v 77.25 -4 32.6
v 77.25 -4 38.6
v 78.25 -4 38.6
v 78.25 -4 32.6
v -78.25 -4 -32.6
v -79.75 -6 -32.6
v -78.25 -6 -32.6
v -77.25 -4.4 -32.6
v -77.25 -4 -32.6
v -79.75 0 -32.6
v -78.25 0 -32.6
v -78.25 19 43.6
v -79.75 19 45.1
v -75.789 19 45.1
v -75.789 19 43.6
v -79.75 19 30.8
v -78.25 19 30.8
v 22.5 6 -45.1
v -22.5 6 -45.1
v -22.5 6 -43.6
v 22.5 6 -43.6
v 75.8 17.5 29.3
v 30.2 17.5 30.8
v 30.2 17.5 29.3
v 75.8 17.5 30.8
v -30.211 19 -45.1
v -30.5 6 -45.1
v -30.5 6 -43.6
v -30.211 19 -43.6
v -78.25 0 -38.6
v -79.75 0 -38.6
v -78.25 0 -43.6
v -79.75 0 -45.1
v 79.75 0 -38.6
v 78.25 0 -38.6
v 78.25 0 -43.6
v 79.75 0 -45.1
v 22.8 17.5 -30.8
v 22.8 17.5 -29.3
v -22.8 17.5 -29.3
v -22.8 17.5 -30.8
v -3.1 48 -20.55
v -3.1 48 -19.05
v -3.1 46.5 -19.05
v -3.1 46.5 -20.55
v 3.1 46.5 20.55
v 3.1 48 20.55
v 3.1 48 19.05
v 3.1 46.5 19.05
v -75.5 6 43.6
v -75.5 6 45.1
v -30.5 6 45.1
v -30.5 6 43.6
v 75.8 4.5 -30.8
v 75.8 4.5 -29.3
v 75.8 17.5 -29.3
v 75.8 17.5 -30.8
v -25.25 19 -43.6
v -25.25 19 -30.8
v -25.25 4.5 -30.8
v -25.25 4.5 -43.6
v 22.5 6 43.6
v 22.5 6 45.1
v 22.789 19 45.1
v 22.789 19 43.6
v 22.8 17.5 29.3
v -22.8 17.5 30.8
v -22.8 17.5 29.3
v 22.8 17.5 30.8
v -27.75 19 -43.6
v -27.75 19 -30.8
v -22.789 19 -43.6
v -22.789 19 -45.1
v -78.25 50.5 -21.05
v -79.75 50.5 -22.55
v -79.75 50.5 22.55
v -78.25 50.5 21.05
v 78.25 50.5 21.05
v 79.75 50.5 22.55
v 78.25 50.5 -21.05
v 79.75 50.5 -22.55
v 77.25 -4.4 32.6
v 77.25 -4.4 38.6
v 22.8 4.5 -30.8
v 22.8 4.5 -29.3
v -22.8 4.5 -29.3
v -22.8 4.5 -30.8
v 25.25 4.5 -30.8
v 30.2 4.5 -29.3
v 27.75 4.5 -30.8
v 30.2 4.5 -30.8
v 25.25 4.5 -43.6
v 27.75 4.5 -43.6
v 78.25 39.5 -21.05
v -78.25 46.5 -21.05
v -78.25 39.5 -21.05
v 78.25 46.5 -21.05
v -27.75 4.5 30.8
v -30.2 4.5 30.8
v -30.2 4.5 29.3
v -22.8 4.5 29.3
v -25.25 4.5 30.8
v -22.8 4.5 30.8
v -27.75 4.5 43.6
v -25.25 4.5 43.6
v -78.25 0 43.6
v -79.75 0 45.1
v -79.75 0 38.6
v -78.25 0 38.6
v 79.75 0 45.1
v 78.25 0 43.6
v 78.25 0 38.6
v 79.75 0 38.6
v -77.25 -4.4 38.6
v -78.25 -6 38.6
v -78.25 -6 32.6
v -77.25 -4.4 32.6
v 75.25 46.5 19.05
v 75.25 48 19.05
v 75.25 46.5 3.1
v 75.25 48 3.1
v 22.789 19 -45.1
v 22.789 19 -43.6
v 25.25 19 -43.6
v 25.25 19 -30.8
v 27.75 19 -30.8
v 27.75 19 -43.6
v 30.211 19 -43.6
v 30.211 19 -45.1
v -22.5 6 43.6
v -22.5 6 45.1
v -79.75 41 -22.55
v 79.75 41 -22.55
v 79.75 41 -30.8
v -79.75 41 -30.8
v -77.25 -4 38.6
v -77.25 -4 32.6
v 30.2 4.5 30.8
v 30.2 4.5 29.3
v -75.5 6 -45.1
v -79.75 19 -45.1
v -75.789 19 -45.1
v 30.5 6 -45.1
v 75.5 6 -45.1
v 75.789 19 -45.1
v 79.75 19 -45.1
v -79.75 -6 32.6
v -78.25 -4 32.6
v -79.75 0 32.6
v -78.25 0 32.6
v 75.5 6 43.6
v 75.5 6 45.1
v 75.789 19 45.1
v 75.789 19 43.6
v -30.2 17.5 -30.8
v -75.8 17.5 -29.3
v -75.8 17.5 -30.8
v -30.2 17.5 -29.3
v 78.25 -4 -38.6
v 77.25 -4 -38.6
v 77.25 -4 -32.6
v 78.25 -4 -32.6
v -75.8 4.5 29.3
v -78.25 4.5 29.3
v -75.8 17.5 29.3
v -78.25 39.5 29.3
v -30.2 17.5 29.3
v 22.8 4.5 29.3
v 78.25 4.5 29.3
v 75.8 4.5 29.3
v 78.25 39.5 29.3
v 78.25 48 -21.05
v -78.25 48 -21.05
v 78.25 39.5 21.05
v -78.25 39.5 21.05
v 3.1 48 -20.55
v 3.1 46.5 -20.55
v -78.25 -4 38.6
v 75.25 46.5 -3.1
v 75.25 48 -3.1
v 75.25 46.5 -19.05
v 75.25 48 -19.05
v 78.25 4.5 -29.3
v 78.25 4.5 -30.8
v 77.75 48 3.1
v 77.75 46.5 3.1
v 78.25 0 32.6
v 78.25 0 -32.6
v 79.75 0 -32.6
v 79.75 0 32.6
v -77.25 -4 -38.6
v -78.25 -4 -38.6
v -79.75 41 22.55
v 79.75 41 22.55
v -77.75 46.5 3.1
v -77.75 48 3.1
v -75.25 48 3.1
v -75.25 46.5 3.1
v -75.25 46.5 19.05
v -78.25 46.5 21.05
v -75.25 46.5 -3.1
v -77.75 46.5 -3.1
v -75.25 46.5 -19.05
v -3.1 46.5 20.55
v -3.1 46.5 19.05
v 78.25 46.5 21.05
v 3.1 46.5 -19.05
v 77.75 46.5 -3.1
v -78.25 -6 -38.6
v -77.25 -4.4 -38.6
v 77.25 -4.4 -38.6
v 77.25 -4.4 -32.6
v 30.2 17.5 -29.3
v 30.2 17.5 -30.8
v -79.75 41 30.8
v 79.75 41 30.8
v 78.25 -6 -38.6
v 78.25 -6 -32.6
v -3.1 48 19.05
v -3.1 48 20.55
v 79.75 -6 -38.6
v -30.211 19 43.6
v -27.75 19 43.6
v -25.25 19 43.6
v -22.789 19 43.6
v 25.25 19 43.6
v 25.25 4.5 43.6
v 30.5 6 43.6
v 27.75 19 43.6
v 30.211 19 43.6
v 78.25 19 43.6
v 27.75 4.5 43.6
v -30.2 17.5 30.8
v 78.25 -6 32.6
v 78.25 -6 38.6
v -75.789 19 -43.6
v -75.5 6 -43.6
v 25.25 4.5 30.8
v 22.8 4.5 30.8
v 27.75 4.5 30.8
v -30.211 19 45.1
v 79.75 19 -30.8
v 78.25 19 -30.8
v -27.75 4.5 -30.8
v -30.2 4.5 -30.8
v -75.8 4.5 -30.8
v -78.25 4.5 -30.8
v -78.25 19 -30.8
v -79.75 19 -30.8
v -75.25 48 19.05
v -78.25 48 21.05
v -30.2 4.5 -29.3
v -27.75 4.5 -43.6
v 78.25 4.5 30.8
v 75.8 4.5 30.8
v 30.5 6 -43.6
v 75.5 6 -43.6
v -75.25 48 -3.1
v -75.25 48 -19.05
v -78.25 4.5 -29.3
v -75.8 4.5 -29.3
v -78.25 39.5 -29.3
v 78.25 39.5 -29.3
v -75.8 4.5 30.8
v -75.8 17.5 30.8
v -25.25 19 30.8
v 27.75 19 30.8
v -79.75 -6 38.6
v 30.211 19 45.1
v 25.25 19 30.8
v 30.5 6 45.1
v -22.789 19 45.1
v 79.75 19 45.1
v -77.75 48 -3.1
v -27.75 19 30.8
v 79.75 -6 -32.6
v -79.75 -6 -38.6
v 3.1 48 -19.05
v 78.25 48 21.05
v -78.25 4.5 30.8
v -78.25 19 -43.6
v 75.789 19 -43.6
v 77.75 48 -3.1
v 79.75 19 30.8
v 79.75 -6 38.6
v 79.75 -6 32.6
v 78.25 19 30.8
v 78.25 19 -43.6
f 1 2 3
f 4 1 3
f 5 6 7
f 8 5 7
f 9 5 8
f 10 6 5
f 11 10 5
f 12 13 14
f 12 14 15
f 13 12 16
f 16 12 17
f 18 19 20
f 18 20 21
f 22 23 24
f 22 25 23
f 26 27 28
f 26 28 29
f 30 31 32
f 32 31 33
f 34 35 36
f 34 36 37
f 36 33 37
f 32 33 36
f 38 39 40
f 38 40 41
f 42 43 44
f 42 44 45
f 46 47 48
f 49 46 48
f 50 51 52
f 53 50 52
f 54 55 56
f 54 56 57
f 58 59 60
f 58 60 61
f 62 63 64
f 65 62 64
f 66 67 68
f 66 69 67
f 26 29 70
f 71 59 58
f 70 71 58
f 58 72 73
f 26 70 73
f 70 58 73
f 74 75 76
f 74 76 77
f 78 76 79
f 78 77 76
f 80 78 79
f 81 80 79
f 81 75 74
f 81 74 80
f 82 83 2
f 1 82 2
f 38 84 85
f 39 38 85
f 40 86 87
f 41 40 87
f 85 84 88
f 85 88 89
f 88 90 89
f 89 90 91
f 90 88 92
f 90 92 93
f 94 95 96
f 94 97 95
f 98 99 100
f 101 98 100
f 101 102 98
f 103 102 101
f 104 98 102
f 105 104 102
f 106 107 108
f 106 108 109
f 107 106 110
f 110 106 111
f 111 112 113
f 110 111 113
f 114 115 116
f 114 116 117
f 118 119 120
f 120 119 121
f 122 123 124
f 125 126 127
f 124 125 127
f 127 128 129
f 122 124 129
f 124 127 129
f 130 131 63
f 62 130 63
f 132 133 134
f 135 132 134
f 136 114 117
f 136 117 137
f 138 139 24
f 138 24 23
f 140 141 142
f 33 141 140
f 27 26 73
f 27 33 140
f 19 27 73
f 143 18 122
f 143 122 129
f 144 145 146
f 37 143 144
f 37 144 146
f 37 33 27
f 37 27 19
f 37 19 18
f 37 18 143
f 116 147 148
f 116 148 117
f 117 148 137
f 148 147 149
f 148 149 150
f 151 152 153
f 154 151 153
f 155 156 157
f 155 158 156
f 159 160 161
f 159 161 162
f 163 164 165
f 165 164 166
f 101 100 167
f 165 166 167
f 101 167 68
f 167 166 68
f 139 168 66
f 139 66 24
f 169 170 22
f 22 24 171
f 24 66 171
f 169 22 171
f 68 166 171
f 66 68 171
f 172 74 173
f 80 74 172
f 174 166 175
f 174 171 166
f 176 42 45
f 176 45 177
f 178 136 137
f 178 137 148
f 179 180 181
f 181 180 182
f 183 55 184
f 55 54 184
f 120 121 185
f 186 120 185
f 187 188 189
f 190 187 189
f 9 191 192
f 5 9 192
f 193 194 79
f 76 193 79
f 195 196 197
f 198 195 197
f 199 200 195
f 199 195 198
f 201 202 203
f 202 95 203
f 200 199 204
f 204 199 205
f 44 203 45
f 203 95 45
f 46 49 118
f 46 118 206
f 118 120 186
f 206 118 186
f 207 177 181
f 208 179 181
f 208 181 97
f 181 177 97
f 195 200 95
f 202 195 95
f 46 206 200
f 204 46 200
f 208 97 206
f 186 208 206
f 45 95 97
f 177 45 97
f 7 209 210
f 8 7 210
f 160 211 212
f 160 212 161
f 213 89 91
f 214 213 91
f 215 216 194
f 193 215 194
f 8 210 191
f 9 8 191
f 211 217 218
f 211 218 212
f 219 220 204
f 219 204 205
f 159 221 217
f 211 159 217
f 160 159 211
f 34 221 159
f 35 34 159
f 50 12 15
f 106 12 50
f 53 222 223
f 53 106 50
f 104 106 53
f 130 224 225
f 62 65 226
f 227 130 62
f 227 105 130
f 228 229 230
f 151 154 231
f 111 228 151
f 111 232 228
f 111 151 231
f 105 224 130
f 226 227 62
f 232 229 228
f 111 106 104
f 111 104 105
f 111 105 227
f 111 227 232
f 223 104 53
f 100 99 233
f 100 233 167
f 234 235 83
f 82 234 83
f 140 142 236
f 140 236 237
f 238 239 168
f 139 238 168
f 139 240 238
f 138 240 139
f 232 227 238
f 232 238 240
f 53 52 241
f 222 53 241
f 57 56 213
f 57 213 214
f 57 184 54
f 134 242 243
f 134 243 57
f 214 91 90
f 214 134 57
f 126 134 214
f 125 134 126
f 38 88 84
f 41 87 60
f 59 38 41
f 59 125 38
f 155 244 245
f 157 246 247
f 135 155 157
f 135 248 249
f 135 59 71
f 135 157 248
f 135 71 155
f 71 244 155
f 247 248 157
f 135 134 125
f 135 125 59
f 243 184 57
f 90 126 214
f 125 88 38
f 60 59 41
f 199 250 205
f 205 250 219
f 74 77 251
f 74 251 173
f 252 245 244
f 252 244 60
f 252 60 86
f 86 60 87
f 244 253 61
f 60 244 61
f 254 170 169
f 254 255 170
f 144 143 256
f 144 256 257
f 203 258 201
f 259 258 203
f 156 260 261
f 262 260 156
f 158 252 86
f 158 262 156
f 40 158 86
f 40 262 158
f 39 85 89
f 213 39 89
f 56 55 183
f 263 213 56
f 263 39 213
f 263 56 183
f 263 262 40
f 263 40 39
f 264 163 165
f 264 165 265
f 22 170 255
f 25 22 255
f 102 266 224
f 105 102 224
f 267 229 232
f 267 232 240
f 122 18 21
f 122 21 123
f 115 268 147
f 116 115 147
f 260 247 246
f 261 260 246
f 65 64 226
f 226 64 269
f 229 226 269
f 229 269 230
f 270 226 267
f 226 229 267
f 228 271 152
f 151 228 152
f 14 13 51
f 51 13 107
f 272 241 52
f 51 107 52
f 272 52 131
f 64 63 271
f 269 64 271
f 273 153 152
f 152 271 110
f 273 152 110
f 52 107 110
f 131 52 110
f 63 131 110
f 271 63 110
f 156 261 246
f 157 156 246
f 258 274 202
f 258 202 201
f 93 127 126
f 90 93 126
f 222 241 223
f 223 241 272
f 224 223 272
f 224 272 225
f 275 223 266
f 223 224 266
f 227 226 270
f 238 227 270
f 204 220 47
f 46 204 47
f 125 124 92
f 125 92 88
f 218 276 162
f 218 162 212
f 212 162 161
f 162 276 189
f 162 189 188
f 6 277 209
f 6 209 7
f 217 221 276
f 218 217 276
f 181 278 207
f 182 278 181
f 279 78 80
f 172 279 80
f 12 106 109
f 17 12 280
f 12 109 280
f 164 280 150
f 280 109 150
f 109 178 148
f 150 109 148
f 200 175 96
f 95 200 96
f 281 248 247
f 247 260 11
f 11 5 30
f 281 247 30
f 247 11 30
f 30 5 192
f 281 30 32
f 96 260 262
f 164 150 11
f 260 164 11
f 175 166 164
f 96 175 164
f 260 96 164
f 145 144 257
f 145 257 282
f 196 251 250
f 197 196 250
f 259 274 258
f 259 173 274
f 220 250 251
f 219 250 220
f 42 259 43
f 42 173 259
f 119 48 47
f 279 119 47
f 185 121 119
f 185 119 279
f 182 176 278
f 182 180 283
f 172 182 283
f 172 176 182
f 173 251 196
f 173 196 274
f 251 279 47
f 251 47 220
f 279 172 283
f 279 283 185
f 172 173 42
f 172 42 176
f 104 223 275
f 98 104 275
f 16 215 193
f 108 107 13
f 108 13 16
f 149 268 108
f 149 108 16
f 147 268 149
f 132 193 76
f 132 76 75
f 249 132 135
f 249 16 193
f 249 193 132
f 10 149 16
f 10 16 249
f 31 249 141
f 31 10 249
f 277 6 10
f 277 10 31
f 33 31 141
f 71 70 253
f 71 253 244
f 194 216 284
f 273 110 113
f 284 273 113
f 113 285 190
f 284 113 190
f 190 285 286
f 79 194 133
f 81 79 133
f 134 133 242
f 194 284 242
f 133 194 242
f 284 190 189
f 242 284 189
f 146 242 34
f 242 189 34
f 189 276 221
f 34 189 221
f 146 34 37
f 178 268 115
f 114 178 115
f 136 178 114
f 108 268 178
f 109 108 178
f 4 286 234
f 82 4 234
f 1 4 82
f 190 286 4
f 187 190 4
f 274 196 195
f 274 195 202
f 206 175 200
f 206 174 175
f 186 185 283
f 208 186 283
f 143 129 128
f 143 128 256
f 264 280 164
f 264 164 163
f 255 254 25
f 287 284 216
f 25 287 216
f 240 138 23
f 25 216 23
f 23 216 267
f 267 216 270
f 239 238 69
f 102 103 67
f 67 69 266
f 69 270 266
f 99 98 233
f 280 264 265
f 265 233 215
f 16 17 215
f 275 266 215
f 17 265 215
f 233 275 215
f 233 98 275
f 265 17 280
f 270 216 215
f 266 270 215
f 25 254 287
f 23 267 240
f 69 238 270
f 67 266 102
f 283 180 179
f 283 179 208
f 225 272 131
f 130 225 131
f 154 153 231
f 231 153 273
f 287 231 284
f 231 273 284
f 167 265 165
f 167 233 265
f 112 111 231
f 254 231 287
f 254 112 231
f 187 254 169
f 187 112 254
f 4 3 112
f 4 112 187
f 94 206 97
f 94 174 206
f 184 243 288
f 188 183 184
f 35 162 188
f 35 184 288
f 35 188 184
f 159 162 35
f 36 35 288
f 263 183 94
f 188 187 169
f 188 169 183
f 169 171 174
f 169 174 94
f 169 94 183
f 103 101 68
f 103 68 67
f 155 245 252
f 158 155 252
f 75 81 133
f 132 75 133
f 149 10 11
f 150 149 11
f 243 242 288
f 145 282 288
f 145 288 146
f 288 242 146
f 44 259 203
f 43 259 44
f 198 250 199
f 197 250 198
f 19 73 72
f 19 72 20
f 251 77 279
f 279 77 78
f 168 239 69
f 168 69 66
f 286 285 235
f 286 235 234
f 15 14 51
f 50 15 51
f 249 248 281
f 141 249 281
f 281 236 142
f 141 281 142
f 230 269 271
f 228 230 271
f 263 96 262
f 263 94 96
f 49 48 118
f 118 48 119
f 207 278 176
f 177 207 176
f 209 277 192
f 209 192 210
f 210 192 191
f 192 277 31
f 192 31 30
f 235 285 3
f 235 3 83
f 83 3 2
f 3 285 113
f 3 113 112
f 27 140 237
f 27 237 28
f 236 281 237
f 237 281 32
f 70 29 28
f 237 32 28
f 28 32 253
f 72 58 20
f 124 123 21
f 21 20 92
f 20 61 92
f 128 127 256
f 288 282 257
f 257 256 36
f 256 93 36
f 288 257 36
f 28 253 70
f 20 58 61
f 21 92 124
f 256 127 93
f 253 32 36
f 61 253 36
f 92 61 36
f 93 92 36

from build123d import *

# Parameters (mm, degrees)
SKETCH_1_W                 = 159.5
SKETCH_1_H                 = 90.2
EXTRUDE_1_DEPTH            = 50.5
CUT_EXTRUDE_1_DEPTH        = 174.275820587
SHELL_1_T                  = -1.5
SKETCH_3_W                 = 6
SKETCH_3_H                 = 6
EXTRUDE_3_DEPTH            = 1.5
EXTRUDE_4_DEPTH            = 6
MIRROR_2_COPY_1_SKETCH_W   = 6
MIRROR_2_COPY_1_SKETCH_H   = 6
MIRROR_2_COPY_1_DEPTH      = 1.5
MIRROR_2_COPY_2_DEPTH      = 6
SKETCH_6_W                 = 50.5
SKETCH_6_H                 = 12.8
CUT_EXTRUDE_2_DEPTH        = 20
CUT_EXTRUDE_3_DEPTH        = 10
PATTERN_LINEAR_1_COUNT     = 2
PATTERN_LINEAR_1_PITCH     = 53
PATTERN_LINEAR_1_COL_COUNT = 2
PATTERN_LINEAR_1_COL_PITCH = 53
SKETCH_8_W                 = 2.45
SKETCH_8_H                 = 1.5
EXTRUDE_5_DEPTH            = 16
SKETCH_9_W                 = 156.5
SKETCH_9_H                 = 22.55
CUT_EXTRUDE_4_DEPTH        = 4.5
MIRROR_3_COPY_1_DEPTH      = 10
MIRROR_3_COPY_2_DEPTH      = 10
SKETCH_10_W                = 159.5
SKETCH_10_H                = 45.1
EXTRUDE_6_DEPTH            = 4
SKETCH_11_W                = 156.5
SKETCH_11_H                = 42.1
CUT_EXTRUDE_6_DEPTH        = 2.5
SKETCH_12_W                = 150.5
SKETCH_12_H                = 38.1
CUT_EXTRUDE_7_DEPTH        = 4
SKETCH_13_W                = 4
SKETCH_13_H                = 6.2
SKETCH_13_W_2              = 6.2
SKETCH_13_H_2              = 4
CUT_EXTRUDE_8_DEPTH        = 4


with BuildPart() as part:
    # Эскиз1 → Бобышка-Вытянуть1 (new body)
    with BuildSketch(Plane(origin=(0, 0, 0), x_dir=(1, 0, 0), z_dir=(0, 1, 0))):
        Rectangle(SKETCH_1_W, SKETCH_1_H)
    extrude(amount=EXTRUDE_1_DEPTH)

    # Эскиз2 → Вырез-Вытянуть1 (cut, through all)
    with BuildSketch(Plane(origin=(79.75, 0, 0), x_dir=(0, 0, -1), z_dir=(1, 0, 0))):
        Polygon((-46.1, 19), (-30.8, 19), (-30.8, 41), (-22.55, 41), (-22.55, 51.5), (22.55, 51.5), (22.55, 41), (30.8, 41), (30.8, 19), (46.1, 19), (46.1, 52.5), (-46.1, 52.5), align=None)
    extrude(amount=-CUT_EXTRUDE_1_DEPTH, mode=Mode.SUBTRACT)

    # Оболочка1
    shell_1_openings = [part.faces().sort_by_distance(p)[0] for p in [
        (0, 0, 0),
    ]]
    offset(amount=SHELL_1_T, openings=shell_1_openings, kind=Kind.INTERSECTION)

    # Эскиз3 → Бобышка-Вытянуть3 (add)
    with BuildSketch(Plane(origin=(79.75, 0, 0), x_dir=(0, 0, -1), z_dir=(1, 0, 0))):
        with Locations((-35.6, -3)):
            Rectangle(SKETCH_3_W, SKETCH_3_H)
    extrude_3 = extrude(amount=-EXTRUDE_3_DEPTH)

    # Эскиз4 → Бобышка-Вытянуть4 (add)
    with BuildSketch(Plane.XY.offset(38.6)):
        Polygon((78.25, -6), (77.25, -4.4), (77.25, -4), (78.75, -4), (78.75, -6), align=None)
    extrude_4 = extrude(amount=-EXTRUDE_4_DEPTH)

    # Зеркальное отражение1: Бобышка-Вытянуть3, Бобышка-Вытянуть4 across plane
    add(extrude_3.mirror(Plane.XY))
    add(extrude_4.mirror(Plane.XY))

    # Зеркальное отражение2: Бобышка-Вытянуть3, Бобышка-Вытянуть4 across plane
    add(extrude_3.mirror(Plane(origin=(0, 0, 0), x_dir=(0, 0, 1), z_dir=(1, 0, 0))))
    add(extrude_4.mirror(Plane(origin=(0, 0, 0), x_dir=(0, 0, 1), z_dir=(1, 0, 0))))

    # Зеркальное отражение2 copy 1 sketch → Зеркальное отражение2 copy 1 (add)
    with BuildSketch(Plane.ZY.offset(79.75)):
        with Locations((-35.6, -3)):
            Rectangle(MIRROR_2_COPY_1_SKETCH_W, MIRROR_2_COPY_1_SKETCH_H)
    extrude(amount=-MIRROR_2_COPY_1_DEPTH)

    # Зеркальное отражение2 copy 2 sketch → Зеркальное отражение2 copy 2 (add)
    with BuildSketch(Plane(origin=(0, 0, -38.6), x_dir=(-1, 0, 0), z_dir=(0, 0, -1))):
        Polygon((78.25, -6), (77.25, -4.4), (77.25, -4), (78.75, -4), (78.75, -6), align=None)
    extrude(amount=-MIRROR_2_COPY_2_DEPTH)

    # Эскиз6 → Вырез-Вытянуть2 (cut)
    with BuildSketch(Plane(origin=(0, 19, 0), x_dir=(1, 0, 0), z_dir=(0, 1, 0))):
        with Locations((0, -37.2)):
            Rectangle(SKETCH_6_W, SKETCH_6_H)
        with Locations((-53, -37.2)):
            Rectangle(SKETCH_6_W, SKETCH_6_H)
        with Locations((53, -37.2)):
            Rectangle(SKETCH_6_W, SKETCH_6_H)
    cut_extrude_2 = extrude(amount=-CUT_EXTRUDE_2_DEPTH, mode=Mode.SUBTRACT)

    # Эскиз7 → Вырез-Вытянуть3 (cut)
    with BuildSketch(Plane.XY.offset(45.1)):
        Polygon((-22.8, 19.5), (-22.5, 6), (22.5, 6), (22.8, 19.5), align=None)
    cut_extrude_3 = extrude(amount=-CUT_EXTRUDE_3_DEPTH, mode=Mode.SUBTRACT)

    # Линейный массив1: Вырез-Вытянуть3 ×2
    with Locations(*[(i * PATTERN_LINEAR_1_PITCH, 0, 0) for i in range(1, PATTERN_LINEAR_1_COUNT)]):
        add(cut_extrude_3, mode=Mode.SUBTRACT)

    # Линейный массив1 col: Вырез-Вытянуть3 ×2
    with Locations(*[(-i * PATTERN_LINEAR_1_COL_PITCH, 0, 0) for i in range(1, PATTERN_LINEAR_1_COL_COUNT)]):
        add(cut_extrude_3, mode=Mode.SUBTRACT)

    # Эскиз8 → Бобышка-Вытянуть5 (add)
    with BuildSketch(Plane.XZ.offset(-17.5)):
        Polygon((-30.2, 30.8), (-30.2, 29.3), (-22.8, 29.3), (-22.8, 30.8), (-25.25, 30.8), (-25.25, 43.6), (-27.75, 43.6), (-27.75, 30.8), align=None)
        Polygon((22.8, 30.8), (22.8, 29.3), (30.2, 29.3), (30.2, 30.8), (27.75, 30.8), (27.75, 43.6), (25.25, 43.6), (25.25, 30.8), align=None)
        with Locations((-77.025, 30.05)):
            Rectangle(SKETCH_8_W, SKETCH_8_H)
        with Locations((77.025, 30.05)):
            Rectangle(SKETCH_8_W, SKETCH_8_H)
    extrude_5 = extrude(amount=EXTRUDE_5_DEPTH)

    # Эскиз9 → Вырез-Вытянуть4 (cut)
    with BuildSketch(Plane.XZ):
        with Locations((0, 32.325)):
            Rectangle(SKETCH_9_W, SKETCH_9_H)
    cut_extrude_4 = extrude(amount=-CUT_EXTRUDE_4_DEPTH, mode=Mode.SUBTRACT)

    # Зеркальное отражение3: Вырез-Вытянуть2, Вырез-Вытянуть3, Бобышка-Вытянуть5, Вырез-Вытянуть4 across plane
    add(cut_extrude_2.mirror(Plane.XY), mode=Mode.SUBTRACT)
    add(cut_extrude_3.mirror(Plane.XY), mode=Mode.SUBTRACT)
    add(extrude_5.mirror(Plane.XY))
    add(cut_extrude_4.mirror(Plane.XY), mode=Mode.SUBTRACT)

    # Зеркальное отражение3 copy 1 sketch → Зеркальное отражение3 copy 1 (cut)
    with BuildSketch(Plane(origin=(53, 0, -45.1), x_dir=(1, 0, 0), z_dir=(0, 0, -1))):
        Polygon((-22.8, -19.5), (-22.5, -6), (22.5, -6), (22.8, -19.5), align=None)
    extrude(amount=-MIRROR_3_COPY_1_DEPTH, mode=Mode.SUBTRACT)

    # Зеркальное отражение3 copy 2 sketch → Зеркальное отражение3 copy 2 (cut)
    with BuildSketch(Plane(origin=(-53, 0, -45.1), x_dir=(1, 0, 0), z_dir=(0, 0, -1))):
        Polygon((-22.8, -19.5), (-22.5, -6), (22.5, -6), (22.8, -19.5), align=None)
    extrude(amount=-MIRROR_3_COPY_2_DEPTH, mode=Mode.SUBTRACT)

    # Эскиз10 → Бобышка-Вытянуть6 (add)
    with BuildSketch(Plane(origin=(0, 50.5, 0), x_dir=(1, 0, 0), z_dir=(0, 1, 0))):
        Rectangle(SKETCH_10_W, SKETCH_10_H)
    extrude(amount=-EXTRUDE_6_DEPTH)

    # Эскиз11 → Вырез-Вытянуть6 (cut)
    with BuildSketch(Plane(origin=(0, 50.5, 0), x_dir=(1, 0, 0), z_dir=(0, 1, 0))):
        Rectangle(SKETCH_11_W, SKETCH_11_H)
    extrude(amount=-CUT_EXTRUDE_6_DEPTH, mode=Mode.SUBTRACT)

    # Эскиз12 → Вырез-Вытянуть7 (cut)
    with BuildSketch(Plane(origin=(0, 48, 0), x_dir=(1, 0, 0), z_dir=(0, 1, 0))):
        Rectangle(SKETCH_12_W, SKETCH_12_H)
    extrude(amount=-CUT_EXTRUDE_7_DEPTH, mode=Mode.SUBTRACT)

    # Эскиз13 → Вырез-Вытянуть8 (cut)
    with BuildSketch(Plane(origin=(0, 48, 0), x_dir=(1, 0, 0), z_dir=(0, 1, 0))):
        with Locations((-75.75, 0)):
            Rectangle(SKETCH_13_W, SKETCH_13_H)
        with Locations((0, 18.55)):
            Rectangle(SKETCH_13_W_2, SKETCH_13_H_2)
        with Locations((0, -18.55)):
            Rectangle(SKETCH_13_W_2, SKETCH_13_H_2)
        with Locations((75.75, 0)):
            Rectangle(SKETCH_13_W, SKETCH_13_H)
    extrude(amount=-CUT_EXTRUDE_8_DEPTH, mode=Mode.SUBTRACT)


solid = part.part
